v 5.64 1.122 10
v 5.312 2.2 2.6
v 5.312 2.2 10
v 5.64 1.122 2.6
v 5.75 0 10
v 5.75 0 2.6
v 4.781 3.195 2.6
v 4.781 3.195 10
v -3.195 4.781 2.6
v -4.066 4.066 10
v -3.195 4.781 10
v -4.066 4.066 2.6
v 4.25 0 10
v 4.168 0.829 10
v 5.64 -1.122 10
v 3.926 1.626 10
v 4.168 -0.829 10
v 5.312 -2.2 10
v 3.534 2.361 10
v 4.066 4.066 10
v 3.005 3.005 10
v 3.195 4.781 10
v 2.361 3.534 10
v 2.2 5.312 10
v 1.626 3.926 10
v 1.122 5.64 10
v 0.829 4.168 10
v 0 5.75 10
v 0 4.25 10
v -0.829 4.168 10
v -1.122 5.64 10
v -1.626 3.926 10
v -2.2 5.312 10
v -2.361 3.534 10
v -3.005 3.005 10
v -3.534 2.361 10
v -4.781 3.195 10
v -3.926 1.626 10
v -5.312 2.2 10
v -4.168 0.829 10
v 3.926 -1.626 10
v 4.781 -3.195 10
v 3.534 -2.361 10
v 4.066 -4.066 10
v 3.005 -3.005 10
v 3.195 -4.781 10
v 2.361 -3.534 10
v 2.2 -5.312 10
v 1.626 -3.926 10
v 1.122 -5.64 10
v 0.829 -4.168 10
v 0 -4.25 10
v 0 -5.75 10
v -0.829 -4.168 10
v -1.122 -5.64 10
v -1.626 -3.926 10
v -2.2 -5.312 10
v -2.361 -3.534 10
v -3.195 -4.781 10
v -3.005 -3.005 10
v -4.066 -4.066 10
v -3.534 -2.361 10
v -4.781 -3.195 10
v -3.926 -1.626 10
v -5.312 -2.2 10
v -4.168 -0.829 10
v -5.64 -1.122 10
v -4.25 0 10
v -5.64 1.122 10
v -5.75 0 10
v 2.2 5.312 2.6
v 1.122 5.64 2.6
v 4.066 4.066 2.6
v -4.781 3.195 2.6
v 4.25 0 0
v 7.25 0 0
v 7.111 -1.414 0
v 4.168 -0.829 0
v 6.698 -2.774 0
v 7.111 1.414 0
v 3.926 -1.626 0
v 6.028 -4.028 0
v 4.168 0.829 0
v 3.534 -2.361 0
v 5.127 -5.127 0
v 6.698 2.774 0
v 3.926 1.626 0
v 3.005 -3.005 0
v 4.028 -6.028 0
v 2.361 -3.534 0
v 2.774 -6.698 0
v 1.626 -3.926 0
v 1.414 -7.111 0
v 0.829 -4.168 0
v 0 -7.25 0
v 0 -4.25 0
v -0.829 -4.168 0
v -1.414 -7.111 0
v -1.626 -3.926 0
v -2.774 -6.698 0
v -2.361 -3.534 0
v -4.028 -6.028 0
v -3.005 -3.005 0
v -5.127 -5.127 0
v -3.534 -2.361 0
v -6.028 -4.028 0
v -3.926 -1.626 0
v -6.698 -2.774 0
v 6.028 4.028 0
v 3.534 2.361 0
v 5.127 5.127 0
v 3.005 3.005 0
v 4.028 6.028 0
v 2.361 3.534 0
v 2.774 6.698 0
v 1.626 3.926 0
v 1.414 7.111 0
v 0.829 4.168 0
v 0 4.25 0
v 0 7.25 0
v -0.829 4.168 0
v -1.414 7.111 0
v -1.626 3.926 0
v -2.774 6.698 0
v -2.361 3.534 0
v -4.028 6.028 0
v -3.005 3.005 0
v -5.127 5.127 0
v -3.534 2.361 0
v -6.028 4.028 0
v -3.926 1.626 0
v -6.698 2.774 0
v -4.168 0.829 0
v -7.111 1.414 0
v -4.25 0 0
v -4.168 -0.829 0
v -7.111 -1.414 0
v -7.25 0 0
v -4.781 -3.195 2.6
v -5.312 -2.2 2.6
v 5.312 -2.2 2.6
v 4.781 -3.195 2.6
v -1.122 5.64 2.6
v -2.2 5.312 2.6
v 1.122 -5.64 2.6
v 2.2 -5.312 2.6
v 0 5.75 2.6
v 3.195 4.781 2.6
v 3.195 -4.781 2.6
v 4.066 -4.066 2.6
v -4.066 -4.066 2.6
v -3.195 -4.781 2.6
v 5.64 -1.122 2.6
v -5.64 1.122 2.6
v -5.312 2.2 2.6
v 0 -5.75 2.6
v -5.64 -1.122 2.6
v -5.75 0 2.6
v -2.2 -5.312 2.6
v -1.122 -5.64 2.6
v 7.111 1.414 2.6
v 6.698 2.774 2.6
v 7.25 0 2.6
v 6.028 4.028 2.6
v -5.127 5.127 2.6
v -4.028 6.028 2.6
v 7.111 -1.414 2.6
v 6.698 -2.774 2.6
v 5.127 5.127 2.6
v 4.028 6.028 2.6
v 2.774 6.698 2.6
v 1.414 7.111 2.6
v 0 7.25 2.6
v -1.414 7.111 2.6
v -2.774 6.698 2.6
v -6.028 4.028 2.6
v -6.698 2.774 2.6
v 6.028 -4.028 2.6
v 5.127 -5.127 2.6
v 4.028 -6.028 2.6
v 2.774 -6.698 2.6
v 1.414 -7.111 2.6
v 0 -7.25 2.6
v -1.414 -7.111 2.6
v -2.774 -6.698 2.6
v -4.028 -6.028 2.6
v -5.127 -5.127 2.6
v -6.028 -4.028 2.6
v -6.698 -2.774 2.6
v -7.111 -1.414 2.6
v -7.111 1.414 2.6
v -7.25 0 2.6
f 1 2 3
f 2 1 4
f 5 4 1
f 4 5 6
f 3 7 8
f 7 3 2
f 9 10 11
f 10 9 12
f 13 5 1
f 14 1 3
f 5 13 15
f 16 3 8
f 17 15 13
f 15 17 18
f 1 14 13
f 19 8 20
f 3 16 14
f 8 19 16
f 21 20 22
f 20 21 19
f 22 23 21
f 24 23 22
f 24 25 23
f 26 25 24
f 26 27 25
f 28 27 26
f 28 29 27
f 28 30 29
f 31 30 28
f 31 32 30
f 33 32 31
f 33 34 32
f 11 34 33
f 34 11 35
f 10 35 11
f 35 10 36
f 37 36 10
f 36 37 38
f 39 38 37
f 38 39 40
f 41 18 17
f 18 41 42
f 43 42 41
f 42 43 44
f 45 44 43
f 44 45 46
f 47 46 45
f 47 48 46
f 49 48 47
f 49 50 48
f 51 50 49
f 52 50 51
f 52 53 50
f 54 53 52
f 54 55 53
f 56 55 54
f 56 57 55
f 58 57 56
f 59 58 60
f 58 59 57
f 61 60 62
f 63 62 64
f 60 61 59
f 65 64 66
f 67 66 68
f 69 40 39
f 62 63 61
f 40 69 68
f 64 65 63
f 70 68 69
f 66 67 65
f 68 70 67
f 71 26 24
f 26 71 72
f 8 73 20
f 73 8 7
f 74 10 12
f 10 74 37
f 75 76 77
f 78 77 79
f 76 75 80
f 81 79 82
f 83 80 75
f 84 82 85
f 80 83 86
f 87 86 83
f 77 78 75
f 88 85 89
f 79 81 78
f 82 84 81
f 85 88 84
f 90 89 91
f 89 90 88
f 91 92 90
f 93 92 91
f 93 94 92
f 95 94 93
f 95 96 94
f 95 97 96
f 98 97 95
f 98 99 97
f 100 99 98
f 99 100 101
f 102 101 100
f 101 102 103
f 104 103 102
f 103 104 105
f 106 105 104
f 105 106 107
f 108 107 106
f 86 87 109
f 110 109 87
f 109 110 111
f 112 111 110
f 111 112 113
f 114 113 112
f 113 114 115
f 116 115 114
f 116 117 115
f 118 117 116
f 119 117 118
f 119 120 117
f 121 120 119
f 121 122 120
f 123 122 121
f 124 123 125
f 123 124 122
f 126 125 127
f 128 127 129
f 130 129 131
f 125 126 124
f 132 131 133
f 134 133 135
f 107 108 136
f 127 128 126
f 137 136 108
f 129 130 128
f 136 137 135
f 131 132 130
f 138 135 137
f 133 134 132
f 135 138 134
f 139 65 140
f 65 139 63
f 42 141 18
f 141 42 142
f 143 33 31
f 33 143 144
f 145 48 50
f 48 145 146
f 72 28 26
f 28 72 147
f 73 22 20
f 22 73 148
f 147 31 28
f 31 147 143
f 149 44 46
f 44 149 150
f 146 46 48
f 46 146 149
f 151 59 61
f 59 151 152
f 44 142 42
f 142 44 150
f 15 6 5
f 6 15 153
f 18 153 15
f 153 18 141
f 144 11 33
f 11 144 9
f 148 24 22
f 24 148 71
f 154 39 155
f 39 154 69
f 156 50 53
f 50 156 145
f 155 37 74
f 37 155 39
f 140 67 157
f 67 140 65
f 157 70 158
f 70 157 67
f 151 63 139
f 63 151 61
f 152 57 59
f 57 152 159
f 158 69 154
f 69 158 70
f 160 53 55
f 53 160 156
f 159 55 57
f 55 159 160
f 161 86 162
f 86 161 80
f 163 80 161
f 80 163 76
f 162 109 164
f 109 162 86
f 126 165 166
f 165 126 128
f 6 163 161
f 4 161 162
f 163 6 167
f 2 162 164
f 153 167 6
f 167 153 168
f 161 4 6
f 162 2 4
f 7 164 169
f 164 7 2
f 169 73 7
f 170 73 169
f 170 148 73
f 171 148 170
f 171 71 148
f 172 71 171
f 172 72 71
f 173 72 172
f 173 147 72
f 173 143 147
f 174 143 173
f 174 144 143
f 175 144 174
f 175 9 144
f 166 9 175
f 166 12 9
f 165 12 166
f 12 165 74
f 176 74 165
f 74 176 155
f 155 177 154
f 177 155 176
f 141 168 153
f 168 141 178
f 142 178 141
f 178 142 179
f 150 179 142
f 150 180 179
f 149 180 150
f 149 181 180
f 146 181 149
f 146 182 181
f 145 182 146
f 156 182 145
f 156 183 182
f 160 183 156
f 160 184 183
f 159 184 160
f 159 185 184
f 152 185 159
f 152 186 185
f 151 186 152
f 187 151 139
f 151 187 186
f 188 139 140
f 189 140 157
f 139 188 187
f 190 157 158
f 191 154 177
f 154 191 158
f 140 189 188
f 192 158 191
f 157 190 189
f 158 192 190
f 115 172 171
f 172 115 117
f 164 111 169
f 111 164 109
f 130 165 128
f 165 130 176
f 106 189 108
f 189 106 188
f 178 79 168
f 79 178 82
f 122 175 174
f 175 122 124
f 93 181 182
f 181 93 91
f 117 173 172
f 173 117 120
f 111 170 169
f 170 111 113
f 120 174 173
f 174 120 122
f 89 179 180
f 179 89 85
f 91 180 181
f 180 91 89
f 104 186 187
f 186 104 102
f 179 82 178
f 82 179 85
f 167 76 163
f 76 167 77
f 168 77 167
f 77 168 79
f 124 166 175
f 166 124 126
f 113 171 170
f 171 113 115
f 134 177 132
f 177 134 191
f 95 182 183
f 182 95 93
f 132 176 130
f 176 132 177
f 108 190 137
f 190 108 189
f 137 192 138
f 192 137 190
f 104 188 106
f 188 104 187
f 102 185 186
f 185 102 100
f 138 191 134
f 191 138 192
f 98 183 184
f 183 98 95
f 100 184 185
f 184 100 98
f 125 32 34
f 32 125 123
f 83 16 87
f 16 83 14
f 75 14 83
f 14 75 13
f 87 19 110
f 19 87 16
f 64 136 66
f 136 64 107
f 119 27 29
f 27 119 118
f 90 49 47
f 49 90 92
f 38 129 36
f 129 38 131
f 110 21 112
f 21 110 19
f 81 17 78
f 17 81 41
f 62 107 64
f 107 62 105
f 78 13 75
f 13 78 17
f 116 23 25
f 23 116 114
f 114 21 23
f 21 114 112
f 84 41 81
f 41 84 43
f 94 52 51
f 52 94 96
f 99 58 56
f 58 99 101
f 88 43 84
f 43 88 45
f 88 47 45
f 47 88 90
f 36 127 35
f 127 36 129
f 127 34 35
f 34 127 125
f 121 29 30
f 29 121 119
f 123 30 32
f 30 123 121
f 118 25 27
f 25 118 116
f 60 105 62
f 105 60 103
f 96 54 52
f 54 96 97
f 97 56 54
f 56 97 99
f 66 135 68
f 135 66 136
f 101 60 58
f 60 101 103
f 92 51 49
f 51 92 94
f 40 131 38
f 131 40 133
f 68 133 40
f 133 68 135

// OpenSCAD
$fn = 32;

// ----------------------------------------------------------------------
// Spacer sleeve: 11.5 / 8.5 x 10 mm
// ----------------------------------------------------------------------

// --- parameters (mm) ---
tube_d = 11.5;            // outside diameter
bore_d = 8.5;             // shaft bore
tube_l = 10;              // sleeve length
flange_d = 14.5;          // collar diameter
flange_t = 2;             // collar thickness

module sleeve() {
  cylinder(h = tube_l, d = tube_d);
  cylinder(h = flange_t + 0.6, d = flange_d);
}

difference() {
  sleeve();
  translate([0, 0, -1]) cylinder(h = tube_l + 2, d = bore_d);
}
